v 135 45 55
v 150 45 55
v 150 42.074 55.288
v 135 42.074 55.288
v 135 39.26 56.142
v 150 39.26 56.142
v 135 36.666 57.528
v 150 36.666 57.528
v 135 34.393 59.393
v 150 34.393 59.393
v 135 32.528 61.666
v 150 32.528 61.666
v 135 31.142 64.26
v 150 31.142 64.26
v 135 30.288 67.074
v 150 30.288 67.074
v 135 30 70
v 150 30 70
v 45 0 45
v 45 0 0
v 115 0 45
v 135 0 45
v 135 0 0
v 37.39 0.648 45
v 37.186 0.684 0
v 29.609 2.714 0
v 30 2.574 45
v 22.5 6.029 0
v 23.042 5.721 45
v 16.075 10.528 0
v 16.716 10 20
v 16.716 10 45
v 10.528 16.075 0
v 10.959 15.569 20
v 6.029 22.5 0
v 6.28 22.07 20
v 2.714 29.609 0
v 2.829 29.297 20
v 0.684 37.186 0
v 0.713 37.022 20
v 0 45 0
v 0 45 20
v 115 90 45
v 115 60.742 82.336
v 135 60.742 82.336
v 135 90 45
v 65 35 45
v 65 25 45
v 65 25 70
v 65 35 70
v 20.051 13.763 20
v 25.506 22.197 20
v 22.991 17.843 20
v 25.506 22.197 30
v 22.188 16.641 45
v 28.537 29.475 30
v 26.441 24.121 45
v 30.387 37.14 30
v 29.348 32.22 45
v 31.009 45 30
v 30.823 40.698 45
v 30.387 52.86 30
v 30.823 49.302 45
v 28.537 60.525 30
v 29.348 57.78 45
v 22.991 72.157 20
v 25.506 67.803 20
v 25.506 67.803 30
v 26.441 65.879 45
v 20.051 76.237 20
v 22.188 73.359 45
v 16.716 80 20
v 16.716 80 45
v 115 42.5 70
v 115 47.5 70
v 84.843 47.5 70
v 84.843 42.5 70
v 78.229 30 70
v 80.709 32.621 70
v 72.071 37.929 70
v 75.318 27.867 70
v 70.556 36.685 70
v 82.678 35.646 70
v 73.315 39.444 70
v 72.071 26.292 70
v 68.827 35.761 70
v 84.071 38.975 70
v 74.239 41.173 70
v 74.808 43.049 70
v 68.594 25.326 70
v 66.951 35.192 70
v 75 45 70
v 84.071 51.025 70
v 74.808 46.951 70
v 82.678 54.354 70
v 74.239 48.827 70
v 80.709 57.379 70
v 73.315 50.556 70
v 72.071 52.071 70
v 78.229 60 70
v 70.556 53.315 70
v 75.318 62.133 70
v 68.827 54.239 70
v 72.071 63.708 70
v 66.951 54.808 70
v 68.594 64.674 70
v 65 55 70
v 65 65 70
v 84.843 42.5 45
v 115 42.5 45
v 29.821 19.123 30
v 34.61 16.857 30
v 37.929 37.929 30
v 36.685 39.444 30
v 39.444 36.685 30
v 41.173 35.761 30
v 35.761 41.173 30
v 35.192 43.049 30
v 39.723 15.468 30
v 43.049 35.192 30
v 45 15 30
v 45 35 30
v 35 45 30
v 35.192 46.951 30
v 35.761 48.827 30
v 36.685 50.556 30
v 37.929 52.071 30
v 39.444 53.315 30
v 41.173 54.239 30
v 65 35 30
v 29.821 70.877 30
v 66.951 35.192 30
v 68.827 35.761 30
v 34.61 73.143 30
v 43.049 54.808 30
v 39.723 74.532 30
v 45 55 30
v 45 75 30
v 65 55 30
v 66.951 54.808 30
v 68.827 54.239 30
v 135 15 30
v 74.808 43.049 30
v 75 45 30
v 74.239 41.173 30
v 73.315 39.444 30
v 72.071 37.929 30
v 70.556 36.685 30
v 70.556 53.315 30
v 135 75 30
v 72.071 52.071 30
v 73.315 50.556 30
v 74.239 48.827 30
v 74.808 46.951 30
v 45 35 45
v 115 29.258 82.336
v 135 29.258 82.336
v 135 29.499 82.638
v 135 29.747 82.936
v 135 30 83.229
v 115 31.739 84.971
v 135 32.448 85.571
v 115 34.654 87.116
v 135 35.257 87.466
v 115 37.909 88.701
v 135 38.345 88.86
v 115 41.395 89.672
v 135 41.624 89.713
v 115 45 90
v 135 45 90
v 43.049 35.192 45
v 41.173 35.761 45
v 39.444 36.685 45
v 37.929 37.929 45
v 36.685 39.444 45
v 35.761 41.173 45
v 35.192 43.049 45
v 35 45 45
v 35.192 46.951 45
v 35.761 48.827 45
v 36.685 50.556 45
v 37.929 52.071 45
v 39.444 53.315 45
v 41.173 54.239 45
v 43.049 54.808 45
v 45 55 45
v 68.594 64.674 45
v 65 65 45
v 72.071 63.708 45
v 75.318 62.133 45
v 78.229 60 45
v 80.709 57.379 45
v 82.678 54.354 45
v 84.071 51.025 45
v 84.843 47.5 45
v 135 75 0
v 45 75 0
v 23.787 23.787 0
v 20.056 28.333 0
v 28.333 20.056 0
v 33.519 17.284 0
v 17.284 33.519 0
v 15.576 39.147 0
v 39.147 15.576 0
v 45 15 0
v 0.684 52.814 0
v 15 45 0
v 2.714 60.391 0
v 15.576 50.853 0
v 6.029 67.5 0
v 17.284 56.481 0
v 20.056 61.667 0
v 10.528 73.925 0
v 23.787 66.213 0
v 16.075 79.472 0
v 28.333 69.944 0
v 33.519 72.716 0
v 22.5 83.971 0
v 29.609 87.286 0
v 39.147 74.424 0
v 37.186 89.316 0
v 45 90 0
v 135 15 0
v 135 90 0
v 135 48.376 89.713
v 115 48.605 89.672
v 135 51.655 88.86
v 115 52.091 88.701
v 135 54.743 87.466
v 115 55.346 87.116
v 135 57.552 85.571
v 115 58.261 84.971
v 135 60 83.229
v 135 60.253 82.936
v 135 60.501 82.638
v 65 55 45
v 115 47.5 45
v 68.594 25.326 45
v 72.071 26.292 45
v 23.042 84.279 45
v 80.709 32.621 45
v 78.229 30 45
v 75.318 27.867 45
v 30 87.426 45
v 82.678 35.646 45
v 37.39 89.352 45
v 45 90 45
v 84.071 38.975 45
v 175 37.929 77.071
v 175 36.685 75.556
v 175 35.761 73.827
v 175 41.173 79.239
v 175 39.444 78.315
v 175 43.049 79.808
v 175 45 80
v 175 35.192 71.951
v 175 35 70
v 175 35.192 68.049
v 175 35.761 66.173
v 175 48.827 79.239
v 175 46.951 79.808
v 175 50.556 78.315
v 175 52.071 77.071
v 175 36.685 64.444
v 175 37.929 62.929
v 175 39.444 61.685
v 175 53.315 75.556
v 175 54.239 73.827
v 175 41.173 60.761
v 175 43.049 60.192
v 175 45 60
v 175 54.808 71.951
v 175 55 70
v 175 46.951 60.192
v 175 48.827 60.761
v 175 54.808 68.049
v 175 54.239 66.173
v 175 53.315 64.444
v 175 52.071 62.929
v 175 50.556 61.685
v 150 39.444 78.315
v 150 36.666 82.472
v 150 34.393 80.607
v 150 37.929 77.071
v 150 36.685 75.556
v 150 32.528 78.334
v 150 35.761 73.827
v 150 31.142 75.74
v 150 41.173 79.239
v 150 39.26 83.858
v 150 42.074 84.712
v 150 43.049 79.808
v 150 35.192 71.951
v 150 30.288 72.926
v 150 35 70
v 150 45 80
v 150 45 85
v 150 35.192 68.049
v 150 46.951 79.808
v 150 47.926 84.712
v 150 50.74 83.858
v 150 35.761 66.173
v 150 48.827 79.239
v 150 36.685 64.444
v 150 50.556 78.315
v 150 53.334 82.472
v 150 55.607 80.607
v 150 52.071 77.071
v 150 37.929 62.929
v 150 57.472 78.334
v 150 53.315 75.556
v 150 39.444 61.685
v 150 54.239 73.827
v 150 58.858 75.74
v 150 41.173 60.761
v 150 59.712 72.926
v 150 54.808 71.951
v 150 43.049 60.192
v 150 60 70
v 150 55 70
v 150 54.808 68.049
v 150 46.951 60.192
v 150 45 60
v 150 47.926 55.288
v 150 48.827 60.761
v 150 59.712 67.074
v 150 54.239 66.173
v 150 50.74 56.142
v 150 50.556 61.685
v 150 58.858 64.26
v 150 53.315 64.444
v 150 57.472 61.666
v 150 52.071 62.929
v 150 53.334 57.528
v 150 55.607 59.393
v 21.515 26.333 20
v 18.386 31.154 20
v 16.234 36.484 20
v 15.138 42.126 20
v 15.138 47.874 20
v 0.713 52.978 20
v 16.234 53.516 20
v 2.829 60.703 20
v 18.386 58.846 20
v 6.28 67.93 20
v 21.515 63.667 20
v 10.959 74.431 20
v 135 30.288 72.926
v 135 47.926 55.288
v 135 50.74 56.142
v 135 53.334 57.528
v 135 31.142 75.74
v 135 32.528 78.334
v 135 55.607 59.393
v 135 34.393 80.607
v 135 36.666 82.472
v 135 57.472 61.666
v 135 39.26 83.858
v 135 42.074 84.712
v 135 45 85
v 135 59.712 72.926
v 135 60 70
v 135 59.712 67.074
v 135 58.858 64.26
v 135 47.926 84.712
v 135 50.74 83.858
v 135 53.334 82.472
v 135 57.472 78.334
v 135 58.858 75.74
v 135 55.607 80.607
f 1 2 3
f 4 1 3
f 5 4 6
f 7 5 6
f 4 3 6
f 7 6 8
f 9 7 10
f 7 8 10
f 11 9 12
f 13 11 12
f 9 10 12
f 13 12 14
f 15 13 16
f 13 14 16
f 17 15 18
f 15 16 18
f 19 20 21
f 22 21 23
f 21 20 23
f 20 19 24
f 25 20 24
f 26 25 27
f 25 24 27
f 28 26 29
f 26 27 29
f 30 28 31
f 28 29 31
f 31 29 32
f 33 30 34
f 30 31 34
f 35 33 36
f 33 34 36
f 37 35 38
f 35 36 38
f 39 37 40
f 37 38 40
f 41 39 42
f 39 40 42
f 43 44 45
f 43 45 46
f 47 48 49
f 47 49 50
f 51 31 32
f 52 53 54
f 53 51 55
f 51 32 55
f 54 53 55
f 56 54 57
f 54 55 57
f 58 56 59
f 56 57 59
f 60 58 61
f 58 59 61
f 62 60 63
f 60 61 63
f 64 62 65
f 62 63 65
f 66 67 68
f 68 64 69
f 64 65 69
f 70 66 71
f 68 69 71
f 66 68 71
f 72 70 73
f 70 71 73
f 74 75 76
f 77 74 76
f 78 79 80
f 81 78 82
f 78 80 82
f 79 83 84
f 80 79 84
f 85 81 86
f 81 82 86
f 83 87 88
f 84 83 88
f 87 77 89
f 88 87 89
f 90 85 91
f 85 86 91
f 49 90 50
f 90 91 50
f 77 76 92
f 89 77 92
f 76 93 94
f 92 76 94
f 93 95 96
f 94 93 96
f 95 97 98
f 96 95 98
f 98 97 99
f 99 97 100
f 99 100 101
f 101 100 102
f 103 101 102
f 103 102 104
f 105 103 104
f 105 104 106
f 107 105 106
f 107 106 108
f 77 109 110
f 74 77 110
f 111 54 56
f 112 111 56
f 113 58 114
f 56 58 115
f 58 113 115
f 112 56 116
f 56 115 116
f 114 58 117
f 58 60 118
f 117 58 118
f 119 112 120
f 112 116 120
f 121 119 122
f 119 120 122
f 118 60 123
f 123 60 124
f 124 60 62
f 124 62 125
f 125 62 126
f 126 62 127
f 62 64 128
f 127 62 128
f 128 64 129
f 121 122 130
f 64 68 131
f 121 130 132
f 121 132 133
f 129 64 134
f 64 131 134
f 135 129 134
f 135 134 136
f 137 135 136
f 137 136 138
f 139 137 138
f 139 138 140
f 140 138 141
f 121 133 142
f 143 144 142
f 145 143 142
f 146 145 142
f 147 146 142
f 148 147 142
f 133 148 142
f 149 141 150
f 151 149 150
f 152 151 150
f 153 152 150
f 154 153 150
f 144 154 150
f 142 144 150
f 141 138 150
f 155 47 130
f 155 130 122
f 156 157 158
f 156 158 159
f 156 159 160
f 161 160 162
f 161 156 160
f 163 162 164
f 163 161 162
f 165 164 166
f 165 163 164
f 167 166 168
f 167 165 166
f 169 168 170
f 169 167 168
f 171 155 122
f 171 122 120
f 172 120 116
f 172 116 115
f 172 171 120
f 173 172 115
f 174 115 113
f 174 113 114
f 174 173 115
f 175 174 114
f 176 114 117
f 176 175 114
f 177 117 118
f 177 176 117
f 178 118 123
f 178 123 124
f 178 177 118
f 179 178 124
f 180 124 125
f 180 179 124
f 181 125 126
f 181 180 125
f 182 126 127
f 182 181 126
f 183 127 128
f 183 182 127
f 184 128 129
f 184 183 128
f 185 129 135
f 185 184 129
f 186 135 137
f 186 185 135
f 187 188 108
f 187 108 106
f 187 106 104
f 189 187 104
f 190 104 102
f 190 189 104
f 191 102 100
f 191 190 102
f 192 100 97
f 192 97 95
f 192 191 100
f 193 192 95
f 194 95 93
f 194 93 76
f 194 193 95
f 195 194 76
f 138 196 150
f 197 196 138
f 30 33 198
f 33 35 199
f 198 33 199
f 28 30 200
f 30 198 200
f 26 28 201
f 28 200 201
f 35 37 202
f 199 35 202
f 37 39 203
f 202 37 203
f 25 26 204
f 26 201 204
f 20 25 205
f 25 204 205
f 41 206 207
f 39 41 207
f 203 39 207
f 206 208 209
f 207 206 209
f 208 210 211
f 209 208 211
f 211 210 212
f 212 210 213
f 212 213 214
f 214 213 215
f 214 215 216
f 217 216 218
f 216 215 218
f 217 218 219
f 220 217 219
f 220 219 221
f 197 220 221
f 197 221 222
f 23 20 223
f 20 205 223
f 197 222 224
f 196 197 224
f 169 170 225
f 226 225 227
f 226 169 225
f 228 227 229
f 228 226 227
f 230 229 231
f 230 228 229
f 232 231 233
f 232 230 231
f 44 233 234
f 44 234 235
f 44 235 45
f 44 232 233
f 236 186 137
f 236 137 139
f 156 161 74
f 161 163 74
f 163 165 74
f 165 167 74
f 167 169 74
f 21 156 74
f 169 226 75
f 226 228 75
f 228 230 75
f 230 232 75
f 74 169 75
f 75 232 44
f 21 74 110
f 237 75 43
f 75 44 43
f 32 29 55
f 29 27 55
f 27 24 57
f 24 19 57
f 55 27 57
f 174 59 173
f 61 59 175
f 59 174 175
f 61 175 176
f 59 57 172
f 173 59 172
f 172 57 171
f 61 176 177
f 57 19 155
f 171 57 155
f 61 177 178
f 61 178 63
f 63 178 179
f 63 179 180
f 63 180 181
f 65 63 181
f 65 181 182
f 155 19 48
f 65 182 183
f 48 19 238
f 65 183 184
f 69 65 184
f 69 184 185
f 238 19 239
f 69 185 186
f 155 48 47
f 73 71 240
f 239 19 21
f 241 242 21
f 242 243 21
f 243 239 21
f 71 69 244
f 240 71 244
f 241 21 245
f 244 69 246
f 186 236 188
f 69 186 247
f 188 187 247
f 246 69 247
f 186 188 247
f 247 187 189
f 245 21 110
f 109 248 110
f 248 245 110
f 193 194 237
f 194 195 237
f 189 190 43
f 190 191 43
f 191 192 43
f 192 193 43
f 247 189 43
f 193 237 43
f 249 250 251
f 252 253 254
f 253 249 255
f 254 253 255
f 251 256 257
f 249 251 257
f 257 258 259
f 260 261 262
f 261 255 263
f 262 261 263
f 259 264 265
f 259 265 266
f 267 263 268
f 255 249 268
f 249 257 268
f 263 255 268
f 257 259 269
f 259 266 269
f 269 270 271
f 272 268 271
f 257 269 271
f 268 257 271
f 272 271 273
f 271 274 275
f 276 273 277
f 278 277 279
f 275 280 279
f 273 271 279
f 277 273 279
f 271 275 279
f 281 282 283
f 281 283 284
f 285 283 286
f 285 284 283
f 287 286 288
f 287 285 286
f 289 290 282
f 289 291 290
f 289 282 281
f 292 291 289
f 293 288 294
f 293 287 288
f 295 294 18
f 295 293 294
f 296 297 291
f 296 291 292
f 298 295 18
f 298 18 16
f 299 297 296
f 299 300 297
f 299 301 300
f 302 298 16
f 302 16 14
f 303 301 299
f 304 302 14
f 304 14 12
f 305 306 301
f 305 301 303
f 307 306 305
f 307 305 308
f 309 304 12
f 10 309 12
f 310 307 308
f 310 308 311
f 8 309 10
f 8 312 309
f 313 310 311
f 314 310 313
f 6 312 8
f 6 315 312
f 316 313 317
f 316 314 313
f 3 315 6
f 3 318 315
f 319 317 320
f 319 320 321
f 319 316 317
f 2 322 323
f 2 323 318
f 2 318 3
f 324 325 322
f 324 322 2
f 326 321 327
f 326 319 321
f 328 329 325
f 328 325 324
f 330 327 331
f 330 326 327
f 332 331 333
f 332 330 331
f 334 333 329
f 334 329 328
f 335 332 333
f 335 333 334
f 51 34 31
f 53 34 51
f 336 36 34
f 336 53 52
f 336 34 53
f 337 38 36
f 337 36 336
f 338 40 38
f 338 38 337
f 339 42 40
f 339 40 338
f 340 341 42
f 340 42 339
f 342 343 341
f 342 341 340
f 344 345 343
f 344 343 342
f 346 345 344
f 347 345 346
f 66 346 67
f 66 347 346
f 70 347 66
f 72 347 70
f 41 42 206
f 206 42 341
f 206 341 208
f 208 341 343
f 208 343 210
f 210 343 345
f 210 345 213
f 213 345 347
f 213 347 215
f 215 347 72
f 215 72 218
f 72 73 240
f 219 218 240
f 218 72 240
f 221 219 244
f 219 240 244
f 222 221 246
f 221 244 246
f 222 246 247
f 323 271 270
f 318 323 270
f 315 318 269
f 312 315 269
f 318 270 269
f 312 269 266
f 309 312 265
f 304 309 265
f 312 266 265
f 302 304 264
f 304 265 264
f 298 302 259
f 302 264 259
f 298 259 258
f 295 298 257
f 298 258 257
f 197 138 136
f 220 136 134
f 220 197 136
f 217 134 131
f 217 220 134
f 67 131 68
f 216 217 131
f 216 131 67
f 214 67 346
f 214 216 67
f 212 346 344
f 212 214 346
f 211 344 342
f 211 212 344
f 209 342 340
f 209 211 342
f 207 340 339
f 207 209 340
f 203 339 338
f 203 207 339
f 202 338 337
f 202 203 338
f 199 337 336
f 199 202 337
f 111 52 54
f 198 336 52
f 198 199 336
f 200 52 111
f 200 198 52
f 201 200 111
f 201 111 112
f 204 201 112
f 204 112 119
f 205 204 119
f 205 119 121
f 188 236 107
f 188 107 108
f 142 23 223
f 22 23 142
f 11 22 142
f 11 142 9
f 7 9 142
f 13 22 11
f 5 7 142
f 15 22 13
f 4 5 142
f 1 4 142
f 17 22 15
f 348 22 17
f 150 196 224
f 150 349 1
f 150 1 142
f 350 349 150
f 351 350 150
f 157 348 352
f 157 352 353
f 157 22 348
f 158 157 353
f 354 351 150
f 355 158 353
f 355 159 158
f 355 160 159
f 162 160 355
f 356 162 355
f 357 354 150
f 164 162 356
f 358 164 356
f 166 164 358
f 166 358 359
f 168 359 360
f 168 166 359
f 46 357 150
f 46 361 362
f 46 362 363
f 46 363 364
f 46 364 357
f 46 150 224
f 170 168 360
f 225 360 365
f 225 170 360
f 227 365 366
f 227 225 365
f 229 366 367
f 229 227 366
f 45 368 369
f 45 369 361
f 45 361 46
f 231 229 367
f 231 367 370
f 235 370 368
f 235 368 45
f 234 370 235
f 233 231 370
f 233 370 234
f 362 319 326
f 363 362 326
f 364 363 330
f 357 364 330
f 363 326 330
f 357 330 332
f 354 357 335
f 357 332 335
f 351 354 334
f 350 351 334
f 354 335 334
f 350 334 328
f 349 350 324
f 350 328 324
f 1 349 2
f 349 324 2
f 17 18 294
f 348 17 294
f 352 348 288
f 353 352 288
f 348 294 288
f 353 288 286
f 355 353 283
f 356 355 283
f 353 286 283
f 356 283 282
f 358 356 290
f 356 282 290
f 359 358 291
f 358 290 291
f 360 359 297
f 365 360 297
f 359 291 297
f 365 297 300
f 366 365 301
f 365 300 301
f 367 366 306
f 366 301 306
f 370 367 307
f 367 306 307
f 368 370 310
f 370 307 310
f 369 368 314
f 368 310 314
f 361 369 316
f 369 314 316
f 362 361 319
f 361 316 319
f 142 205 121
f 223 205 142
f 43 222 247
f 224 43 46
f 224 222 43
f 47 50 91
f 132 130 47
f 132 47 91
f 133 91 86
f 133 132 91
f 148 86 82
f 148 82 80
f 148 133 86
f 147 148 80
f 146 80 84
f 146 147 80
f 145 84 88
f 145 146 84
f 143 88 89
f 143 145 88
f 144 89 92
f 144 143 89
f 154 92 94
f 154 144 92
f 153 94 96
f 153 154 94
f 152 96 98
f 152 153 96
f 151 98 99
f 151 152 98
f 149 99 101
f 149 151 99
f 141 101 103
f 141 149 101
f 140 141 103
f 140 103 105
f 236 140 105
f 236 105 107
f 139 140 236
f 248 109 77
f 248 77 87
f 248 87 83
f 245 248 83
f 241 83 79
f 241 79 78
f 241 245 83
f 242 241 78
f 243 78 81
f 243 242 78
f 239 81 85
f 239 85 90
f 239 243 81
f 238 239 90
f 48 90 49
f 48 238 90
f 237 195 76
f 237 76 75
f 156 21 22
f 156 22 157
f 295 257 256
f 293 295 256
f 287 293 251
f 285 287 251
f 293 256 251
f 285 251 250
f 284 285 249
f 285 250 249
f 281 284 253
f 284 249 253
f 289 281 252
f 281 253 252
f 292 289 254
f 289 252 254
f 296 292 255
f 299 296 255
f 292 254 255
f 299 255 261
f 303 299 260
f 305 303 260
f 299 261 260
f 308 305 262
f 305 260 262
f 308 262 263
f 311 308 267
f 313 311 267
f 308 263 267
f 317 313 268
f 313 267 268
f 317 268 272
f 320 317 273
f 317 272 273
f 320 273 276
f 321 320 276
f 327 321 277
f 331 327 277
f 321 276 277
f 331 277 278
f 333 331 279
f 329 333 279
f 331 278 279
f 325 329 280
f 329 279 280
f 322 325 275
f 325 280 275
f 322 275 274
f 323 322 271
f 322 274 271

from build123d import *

# Parameters (mm, degrees)
SKETCH1_W           = 175
SKETCH1_H           = 90
BOSS_EXTRUDE1_DEPTH = 90
CUT_EXTRUDE1_DEPTH  = 90
SKETCH3_W           = 40
SKETCH3_H           = 30
CUT_EXTRUDE2_DEPTH  = 90
SKETCH4_W           = 25
SKETCH4_H           = 5
CUT_EXTRUDE3_DEPTH  = 90
CUT_EXTRUDE4_DEPTH  = 70
CUT_EXTRUDE5_DEPTH  = 308
CUT_EXTRUDE6_DEPTH  = 30
CUT_EXTRUDE7_DEPTH  = 25
CUT_EXTRUDE8_DEPTH  = 15
SKETCH10_W          = 45
SKETCH10_H          = 90
CUT_EXTRUDE9_DEPTH  = 154
BOSS_EXTRUDE2_DEPTH = 25
CUT_EXTRUDE10_DEPTH = 15
SKETCH13_W          = 30.156865167
SKETCH13_H          = 5
BOSS_EXTRUDE3_DEPTH = 25


with BuildPart() as part:
    # Sketch1 → Boss-Extrude1 (new body)
    with BuildSketch(Plane.XY):
        with Locations((87.5, 45)):
            Rectangle(SKETCH1_W, SKETCH1_H)
    extrude(amount=BOSS_EXTRUDE1_DEPTH)

    # Sketch2 → Cut-Extrude1 (cut)
    with BuildSketch(Plane.XY.offset(90)):
        with BuildLine():
            Line((45, 90), (0, 90))
            Line((0, 90), (0, 45))
            ThreePointArc((0, 45), (13.180194847, 76.819805153), (45, 90))
        make_face()
        with BuildLine():
            ThreePointArc((45, 0), (13.180194847, 13.180194847), (0, 45))
            Line((0, 45), (0, 0))
            Line((0, 0), (45, 0))
        make_face()
    extrude(amount=-CUT_EXTRUDE1_DEPTH, mode=Mode.SUBTRACT)

    # Sketch3 → Cut-Extrude2 (cut)
    with BuildSketch(Plane.XY.offset(90)):
        with Locations((155, 75)):
            Rectangle(SKETCH3_W, SKETCH3_H)
        with Locations((155, 15)):
            Rectangle(SKETCH3_W, SKETCH3_H)
    extrude(amount=-CUT_EXTRUDE2_DEPTH, mode=Mode.SUBTRACT)

    # Sketch4 → Cut-Extrude3 (cut)
    with BuildSketch(Plane.XY.offset(90)):
        with Locations((162.5, 57.5)):
            Rectangle(SKETCH4_W, SKETCH4_H)
        with Locations((162.5, 32.5)):
            Rectangle(SKETCH4_W, SKETCH4_H)
    extrude(amount=-CUT_EXTRUDE3_DEPTH, mode=Mode.SUBTRACT)

    # Sketch5 → Cut-Extrude4 (cut)
    with BuildSketch(Plane.XY.offset(90)):
        with BuildLine():
            ThreePointArc((16.715728753, 10), (31.00858661, 45), (16.715728753, 80))
            ThreePointArc((16.715728753, 80), (0, 45), (16.715728753, 10))
        make_face()
    extrude(amount=-CUT_EXTRUDE4_DEPTH, mode=Mode.SUBTRACT)

    # Sketch6 → Cut-Extrude5 (cut)
    with BuildSketch(Plane(origin=(0, 0, 0), x_dir=(0, 0, -1), z_dir=(1, 0, 0))):
        with BuildLine():
            Line((-82.336131476, 60.742295265), (-45, 90))
            Line((-45, 90), (-90, 90))
            Line((-90, 90), (-90, 45))
            ThreePointArc((-90, 45), (-87.982249992, 53.75435236), (-82.336131476, 60.742295265))
        make_face()
        with BuildLine():
            ThreePointArc((-82.336131476, 29.257704735), (-87.982249992, 36.24564764), (-90, 45))
            Line((-90, 45), (-90, 0))
            Line((-90, 0), (-45, 0))
            Line((-45, 0), (-82.336131476, 29.257704735))
        make_face()
    extrude(amount=CUT_EXTRUDE5_DEPTH, mode=Mode.SUBTRACT)

    # Sketch7 → Cut-Extrude6 (cut)
    with BuildSketch(Plane(origin=(0, 0, 0), x_dir=(-1, 0, 0), z_dir=(0, 0, -1))):
        with BuildLine():
            Line((-135, 75), (-45, 75))
            ThreePointArc((-45, 75), (-15, 45), (-45, 15))
            Line((-45, 15), (-135, 15))
            Line((-135, 15), (-135, 75))
        make_face()
    extrude(amount=-CUT_EXTRUDE6_DEPTH, mode=Mode.SUBTRACT)

    # Sketch8 → Cut-Extrude7 (cut)
    with BuildSketch(Plane(origin=(175, 0, 0), x_dir=(0, 0, -1), z_dir=(1, 0, 0))):
        with BuildLine():
            Line((-70, 55), (-87.320508076, 55))
            ThreePointArc((-87.320508076, 55), (-90, 45), (-87.320508076, 35))
            Line((-87.320508076, 35), (-70, 35))
            ThreePointArc((-70, 35), (-80, 45), (-70, 55))
        make_face()
        with BuildLine():
            Line((0, 55), (-70, 55))
            ThreePointArc((-70, 55), (-62.928932188, 52.071067812), (-60, 45))
            ThreePointArc((-60, 45), (-62.928932188, 37.928932188), (-70, 35))
            Line((-70, 35), (0, 35))
            Line((0, 35), (0, 55))
        make_face()
    extrude(amount=-CUT_EXTRUDE7_DEPTH, mode=Mode.SUBTRACT)

    # Sketch9 → Cut-Extrude8 (cut)
    with BuildSketch(Plane(origin=(150, 0, 0), x_dir=(0, 0, -1), z_dir=(1, 0, 0))):
        with BuildLine():
            Line((-70, 60), (-83.228756555, 60))
            ThreePointArc((-83.228756555, 60), (-90, 45), (-83.228756555, 30))
            Line((-83.228756555, 30), (-70, 30))
            ThreePointArc((-70, 30), (-85, 45), (-70, 60))
        make_face()
        with BuildLine():
            Line((0, 60), (-70, 60))
            ThreePointArc((-70, 60), (-59.393398282, 55.606601718), (-55, 45))
            ThreePointArc((-55, 45), (-59.393398282, 34.393398282), (-70, 30))
            Line((-70, 30), (0, 30))
            Line((0, 30), (0, 60))
        make_face()
    extrude(amount=-CUT_EXTRUDE8_DEPTH, mode=Mode.SUBTRACT)

    # Sketch10 → Cut-Extrude9 (cut)
    with BuildSketch(Plane(origin=(115, 0, 0), x_dir=(0, 0, -1), z_dir=(1, 0, 0))):
        with Locations((-67.5, 45)):
            Rectangle(SKETCH10_W, SKETCH10_H)
    extrude(amount=-CUT_EXTRUDE9_DEPTH, mode=Mode.SUBTRACT)

    # Sketch11 → Boss-Extrude2 (add)
    with BuildSketch(Plane.XY.offset(45)):
        with BuildLine():
            Line((65, 55), (65, 65))
            ThreePointArc((65, 65), (85, 45), (65, 25))
            Line((65, 25), (65, 35))
            ThreePointArc((65, 35), (75, 45), (65, 55))
        make_face()
    extrude(amount=BOSS_EXTRUDE2_DEPTH)

    # Sketch12 → Cut-Extrude10 (cut)
    with BuildSketch(Plane.XY.offset(45)):
        with BuildLine():
            Line((65, 35), (45, 35))
            ThreePointArc((45, 35), (35, 45), (45, 55))
            Line((45, 55), (65, 55))
            ThreePointArc((65, 55), (75, 45), (65, 35))
        make_face()
    extrude(amount=-CUT_EXTRUDE10_DEPTH, mode=Mode.SUBTRACT)

    # Sketch13 → Boss-Extrude3 (add)
    with BuildSketch(Plane.XY.offset(45)):
        with Locations((99.921567417, 45)):
            Rectangle(SKETCH13_W, SKETCH13_H)
    extrude(amount=BOSS_EXTRUDE3_DEPTH)


solid = part.part
